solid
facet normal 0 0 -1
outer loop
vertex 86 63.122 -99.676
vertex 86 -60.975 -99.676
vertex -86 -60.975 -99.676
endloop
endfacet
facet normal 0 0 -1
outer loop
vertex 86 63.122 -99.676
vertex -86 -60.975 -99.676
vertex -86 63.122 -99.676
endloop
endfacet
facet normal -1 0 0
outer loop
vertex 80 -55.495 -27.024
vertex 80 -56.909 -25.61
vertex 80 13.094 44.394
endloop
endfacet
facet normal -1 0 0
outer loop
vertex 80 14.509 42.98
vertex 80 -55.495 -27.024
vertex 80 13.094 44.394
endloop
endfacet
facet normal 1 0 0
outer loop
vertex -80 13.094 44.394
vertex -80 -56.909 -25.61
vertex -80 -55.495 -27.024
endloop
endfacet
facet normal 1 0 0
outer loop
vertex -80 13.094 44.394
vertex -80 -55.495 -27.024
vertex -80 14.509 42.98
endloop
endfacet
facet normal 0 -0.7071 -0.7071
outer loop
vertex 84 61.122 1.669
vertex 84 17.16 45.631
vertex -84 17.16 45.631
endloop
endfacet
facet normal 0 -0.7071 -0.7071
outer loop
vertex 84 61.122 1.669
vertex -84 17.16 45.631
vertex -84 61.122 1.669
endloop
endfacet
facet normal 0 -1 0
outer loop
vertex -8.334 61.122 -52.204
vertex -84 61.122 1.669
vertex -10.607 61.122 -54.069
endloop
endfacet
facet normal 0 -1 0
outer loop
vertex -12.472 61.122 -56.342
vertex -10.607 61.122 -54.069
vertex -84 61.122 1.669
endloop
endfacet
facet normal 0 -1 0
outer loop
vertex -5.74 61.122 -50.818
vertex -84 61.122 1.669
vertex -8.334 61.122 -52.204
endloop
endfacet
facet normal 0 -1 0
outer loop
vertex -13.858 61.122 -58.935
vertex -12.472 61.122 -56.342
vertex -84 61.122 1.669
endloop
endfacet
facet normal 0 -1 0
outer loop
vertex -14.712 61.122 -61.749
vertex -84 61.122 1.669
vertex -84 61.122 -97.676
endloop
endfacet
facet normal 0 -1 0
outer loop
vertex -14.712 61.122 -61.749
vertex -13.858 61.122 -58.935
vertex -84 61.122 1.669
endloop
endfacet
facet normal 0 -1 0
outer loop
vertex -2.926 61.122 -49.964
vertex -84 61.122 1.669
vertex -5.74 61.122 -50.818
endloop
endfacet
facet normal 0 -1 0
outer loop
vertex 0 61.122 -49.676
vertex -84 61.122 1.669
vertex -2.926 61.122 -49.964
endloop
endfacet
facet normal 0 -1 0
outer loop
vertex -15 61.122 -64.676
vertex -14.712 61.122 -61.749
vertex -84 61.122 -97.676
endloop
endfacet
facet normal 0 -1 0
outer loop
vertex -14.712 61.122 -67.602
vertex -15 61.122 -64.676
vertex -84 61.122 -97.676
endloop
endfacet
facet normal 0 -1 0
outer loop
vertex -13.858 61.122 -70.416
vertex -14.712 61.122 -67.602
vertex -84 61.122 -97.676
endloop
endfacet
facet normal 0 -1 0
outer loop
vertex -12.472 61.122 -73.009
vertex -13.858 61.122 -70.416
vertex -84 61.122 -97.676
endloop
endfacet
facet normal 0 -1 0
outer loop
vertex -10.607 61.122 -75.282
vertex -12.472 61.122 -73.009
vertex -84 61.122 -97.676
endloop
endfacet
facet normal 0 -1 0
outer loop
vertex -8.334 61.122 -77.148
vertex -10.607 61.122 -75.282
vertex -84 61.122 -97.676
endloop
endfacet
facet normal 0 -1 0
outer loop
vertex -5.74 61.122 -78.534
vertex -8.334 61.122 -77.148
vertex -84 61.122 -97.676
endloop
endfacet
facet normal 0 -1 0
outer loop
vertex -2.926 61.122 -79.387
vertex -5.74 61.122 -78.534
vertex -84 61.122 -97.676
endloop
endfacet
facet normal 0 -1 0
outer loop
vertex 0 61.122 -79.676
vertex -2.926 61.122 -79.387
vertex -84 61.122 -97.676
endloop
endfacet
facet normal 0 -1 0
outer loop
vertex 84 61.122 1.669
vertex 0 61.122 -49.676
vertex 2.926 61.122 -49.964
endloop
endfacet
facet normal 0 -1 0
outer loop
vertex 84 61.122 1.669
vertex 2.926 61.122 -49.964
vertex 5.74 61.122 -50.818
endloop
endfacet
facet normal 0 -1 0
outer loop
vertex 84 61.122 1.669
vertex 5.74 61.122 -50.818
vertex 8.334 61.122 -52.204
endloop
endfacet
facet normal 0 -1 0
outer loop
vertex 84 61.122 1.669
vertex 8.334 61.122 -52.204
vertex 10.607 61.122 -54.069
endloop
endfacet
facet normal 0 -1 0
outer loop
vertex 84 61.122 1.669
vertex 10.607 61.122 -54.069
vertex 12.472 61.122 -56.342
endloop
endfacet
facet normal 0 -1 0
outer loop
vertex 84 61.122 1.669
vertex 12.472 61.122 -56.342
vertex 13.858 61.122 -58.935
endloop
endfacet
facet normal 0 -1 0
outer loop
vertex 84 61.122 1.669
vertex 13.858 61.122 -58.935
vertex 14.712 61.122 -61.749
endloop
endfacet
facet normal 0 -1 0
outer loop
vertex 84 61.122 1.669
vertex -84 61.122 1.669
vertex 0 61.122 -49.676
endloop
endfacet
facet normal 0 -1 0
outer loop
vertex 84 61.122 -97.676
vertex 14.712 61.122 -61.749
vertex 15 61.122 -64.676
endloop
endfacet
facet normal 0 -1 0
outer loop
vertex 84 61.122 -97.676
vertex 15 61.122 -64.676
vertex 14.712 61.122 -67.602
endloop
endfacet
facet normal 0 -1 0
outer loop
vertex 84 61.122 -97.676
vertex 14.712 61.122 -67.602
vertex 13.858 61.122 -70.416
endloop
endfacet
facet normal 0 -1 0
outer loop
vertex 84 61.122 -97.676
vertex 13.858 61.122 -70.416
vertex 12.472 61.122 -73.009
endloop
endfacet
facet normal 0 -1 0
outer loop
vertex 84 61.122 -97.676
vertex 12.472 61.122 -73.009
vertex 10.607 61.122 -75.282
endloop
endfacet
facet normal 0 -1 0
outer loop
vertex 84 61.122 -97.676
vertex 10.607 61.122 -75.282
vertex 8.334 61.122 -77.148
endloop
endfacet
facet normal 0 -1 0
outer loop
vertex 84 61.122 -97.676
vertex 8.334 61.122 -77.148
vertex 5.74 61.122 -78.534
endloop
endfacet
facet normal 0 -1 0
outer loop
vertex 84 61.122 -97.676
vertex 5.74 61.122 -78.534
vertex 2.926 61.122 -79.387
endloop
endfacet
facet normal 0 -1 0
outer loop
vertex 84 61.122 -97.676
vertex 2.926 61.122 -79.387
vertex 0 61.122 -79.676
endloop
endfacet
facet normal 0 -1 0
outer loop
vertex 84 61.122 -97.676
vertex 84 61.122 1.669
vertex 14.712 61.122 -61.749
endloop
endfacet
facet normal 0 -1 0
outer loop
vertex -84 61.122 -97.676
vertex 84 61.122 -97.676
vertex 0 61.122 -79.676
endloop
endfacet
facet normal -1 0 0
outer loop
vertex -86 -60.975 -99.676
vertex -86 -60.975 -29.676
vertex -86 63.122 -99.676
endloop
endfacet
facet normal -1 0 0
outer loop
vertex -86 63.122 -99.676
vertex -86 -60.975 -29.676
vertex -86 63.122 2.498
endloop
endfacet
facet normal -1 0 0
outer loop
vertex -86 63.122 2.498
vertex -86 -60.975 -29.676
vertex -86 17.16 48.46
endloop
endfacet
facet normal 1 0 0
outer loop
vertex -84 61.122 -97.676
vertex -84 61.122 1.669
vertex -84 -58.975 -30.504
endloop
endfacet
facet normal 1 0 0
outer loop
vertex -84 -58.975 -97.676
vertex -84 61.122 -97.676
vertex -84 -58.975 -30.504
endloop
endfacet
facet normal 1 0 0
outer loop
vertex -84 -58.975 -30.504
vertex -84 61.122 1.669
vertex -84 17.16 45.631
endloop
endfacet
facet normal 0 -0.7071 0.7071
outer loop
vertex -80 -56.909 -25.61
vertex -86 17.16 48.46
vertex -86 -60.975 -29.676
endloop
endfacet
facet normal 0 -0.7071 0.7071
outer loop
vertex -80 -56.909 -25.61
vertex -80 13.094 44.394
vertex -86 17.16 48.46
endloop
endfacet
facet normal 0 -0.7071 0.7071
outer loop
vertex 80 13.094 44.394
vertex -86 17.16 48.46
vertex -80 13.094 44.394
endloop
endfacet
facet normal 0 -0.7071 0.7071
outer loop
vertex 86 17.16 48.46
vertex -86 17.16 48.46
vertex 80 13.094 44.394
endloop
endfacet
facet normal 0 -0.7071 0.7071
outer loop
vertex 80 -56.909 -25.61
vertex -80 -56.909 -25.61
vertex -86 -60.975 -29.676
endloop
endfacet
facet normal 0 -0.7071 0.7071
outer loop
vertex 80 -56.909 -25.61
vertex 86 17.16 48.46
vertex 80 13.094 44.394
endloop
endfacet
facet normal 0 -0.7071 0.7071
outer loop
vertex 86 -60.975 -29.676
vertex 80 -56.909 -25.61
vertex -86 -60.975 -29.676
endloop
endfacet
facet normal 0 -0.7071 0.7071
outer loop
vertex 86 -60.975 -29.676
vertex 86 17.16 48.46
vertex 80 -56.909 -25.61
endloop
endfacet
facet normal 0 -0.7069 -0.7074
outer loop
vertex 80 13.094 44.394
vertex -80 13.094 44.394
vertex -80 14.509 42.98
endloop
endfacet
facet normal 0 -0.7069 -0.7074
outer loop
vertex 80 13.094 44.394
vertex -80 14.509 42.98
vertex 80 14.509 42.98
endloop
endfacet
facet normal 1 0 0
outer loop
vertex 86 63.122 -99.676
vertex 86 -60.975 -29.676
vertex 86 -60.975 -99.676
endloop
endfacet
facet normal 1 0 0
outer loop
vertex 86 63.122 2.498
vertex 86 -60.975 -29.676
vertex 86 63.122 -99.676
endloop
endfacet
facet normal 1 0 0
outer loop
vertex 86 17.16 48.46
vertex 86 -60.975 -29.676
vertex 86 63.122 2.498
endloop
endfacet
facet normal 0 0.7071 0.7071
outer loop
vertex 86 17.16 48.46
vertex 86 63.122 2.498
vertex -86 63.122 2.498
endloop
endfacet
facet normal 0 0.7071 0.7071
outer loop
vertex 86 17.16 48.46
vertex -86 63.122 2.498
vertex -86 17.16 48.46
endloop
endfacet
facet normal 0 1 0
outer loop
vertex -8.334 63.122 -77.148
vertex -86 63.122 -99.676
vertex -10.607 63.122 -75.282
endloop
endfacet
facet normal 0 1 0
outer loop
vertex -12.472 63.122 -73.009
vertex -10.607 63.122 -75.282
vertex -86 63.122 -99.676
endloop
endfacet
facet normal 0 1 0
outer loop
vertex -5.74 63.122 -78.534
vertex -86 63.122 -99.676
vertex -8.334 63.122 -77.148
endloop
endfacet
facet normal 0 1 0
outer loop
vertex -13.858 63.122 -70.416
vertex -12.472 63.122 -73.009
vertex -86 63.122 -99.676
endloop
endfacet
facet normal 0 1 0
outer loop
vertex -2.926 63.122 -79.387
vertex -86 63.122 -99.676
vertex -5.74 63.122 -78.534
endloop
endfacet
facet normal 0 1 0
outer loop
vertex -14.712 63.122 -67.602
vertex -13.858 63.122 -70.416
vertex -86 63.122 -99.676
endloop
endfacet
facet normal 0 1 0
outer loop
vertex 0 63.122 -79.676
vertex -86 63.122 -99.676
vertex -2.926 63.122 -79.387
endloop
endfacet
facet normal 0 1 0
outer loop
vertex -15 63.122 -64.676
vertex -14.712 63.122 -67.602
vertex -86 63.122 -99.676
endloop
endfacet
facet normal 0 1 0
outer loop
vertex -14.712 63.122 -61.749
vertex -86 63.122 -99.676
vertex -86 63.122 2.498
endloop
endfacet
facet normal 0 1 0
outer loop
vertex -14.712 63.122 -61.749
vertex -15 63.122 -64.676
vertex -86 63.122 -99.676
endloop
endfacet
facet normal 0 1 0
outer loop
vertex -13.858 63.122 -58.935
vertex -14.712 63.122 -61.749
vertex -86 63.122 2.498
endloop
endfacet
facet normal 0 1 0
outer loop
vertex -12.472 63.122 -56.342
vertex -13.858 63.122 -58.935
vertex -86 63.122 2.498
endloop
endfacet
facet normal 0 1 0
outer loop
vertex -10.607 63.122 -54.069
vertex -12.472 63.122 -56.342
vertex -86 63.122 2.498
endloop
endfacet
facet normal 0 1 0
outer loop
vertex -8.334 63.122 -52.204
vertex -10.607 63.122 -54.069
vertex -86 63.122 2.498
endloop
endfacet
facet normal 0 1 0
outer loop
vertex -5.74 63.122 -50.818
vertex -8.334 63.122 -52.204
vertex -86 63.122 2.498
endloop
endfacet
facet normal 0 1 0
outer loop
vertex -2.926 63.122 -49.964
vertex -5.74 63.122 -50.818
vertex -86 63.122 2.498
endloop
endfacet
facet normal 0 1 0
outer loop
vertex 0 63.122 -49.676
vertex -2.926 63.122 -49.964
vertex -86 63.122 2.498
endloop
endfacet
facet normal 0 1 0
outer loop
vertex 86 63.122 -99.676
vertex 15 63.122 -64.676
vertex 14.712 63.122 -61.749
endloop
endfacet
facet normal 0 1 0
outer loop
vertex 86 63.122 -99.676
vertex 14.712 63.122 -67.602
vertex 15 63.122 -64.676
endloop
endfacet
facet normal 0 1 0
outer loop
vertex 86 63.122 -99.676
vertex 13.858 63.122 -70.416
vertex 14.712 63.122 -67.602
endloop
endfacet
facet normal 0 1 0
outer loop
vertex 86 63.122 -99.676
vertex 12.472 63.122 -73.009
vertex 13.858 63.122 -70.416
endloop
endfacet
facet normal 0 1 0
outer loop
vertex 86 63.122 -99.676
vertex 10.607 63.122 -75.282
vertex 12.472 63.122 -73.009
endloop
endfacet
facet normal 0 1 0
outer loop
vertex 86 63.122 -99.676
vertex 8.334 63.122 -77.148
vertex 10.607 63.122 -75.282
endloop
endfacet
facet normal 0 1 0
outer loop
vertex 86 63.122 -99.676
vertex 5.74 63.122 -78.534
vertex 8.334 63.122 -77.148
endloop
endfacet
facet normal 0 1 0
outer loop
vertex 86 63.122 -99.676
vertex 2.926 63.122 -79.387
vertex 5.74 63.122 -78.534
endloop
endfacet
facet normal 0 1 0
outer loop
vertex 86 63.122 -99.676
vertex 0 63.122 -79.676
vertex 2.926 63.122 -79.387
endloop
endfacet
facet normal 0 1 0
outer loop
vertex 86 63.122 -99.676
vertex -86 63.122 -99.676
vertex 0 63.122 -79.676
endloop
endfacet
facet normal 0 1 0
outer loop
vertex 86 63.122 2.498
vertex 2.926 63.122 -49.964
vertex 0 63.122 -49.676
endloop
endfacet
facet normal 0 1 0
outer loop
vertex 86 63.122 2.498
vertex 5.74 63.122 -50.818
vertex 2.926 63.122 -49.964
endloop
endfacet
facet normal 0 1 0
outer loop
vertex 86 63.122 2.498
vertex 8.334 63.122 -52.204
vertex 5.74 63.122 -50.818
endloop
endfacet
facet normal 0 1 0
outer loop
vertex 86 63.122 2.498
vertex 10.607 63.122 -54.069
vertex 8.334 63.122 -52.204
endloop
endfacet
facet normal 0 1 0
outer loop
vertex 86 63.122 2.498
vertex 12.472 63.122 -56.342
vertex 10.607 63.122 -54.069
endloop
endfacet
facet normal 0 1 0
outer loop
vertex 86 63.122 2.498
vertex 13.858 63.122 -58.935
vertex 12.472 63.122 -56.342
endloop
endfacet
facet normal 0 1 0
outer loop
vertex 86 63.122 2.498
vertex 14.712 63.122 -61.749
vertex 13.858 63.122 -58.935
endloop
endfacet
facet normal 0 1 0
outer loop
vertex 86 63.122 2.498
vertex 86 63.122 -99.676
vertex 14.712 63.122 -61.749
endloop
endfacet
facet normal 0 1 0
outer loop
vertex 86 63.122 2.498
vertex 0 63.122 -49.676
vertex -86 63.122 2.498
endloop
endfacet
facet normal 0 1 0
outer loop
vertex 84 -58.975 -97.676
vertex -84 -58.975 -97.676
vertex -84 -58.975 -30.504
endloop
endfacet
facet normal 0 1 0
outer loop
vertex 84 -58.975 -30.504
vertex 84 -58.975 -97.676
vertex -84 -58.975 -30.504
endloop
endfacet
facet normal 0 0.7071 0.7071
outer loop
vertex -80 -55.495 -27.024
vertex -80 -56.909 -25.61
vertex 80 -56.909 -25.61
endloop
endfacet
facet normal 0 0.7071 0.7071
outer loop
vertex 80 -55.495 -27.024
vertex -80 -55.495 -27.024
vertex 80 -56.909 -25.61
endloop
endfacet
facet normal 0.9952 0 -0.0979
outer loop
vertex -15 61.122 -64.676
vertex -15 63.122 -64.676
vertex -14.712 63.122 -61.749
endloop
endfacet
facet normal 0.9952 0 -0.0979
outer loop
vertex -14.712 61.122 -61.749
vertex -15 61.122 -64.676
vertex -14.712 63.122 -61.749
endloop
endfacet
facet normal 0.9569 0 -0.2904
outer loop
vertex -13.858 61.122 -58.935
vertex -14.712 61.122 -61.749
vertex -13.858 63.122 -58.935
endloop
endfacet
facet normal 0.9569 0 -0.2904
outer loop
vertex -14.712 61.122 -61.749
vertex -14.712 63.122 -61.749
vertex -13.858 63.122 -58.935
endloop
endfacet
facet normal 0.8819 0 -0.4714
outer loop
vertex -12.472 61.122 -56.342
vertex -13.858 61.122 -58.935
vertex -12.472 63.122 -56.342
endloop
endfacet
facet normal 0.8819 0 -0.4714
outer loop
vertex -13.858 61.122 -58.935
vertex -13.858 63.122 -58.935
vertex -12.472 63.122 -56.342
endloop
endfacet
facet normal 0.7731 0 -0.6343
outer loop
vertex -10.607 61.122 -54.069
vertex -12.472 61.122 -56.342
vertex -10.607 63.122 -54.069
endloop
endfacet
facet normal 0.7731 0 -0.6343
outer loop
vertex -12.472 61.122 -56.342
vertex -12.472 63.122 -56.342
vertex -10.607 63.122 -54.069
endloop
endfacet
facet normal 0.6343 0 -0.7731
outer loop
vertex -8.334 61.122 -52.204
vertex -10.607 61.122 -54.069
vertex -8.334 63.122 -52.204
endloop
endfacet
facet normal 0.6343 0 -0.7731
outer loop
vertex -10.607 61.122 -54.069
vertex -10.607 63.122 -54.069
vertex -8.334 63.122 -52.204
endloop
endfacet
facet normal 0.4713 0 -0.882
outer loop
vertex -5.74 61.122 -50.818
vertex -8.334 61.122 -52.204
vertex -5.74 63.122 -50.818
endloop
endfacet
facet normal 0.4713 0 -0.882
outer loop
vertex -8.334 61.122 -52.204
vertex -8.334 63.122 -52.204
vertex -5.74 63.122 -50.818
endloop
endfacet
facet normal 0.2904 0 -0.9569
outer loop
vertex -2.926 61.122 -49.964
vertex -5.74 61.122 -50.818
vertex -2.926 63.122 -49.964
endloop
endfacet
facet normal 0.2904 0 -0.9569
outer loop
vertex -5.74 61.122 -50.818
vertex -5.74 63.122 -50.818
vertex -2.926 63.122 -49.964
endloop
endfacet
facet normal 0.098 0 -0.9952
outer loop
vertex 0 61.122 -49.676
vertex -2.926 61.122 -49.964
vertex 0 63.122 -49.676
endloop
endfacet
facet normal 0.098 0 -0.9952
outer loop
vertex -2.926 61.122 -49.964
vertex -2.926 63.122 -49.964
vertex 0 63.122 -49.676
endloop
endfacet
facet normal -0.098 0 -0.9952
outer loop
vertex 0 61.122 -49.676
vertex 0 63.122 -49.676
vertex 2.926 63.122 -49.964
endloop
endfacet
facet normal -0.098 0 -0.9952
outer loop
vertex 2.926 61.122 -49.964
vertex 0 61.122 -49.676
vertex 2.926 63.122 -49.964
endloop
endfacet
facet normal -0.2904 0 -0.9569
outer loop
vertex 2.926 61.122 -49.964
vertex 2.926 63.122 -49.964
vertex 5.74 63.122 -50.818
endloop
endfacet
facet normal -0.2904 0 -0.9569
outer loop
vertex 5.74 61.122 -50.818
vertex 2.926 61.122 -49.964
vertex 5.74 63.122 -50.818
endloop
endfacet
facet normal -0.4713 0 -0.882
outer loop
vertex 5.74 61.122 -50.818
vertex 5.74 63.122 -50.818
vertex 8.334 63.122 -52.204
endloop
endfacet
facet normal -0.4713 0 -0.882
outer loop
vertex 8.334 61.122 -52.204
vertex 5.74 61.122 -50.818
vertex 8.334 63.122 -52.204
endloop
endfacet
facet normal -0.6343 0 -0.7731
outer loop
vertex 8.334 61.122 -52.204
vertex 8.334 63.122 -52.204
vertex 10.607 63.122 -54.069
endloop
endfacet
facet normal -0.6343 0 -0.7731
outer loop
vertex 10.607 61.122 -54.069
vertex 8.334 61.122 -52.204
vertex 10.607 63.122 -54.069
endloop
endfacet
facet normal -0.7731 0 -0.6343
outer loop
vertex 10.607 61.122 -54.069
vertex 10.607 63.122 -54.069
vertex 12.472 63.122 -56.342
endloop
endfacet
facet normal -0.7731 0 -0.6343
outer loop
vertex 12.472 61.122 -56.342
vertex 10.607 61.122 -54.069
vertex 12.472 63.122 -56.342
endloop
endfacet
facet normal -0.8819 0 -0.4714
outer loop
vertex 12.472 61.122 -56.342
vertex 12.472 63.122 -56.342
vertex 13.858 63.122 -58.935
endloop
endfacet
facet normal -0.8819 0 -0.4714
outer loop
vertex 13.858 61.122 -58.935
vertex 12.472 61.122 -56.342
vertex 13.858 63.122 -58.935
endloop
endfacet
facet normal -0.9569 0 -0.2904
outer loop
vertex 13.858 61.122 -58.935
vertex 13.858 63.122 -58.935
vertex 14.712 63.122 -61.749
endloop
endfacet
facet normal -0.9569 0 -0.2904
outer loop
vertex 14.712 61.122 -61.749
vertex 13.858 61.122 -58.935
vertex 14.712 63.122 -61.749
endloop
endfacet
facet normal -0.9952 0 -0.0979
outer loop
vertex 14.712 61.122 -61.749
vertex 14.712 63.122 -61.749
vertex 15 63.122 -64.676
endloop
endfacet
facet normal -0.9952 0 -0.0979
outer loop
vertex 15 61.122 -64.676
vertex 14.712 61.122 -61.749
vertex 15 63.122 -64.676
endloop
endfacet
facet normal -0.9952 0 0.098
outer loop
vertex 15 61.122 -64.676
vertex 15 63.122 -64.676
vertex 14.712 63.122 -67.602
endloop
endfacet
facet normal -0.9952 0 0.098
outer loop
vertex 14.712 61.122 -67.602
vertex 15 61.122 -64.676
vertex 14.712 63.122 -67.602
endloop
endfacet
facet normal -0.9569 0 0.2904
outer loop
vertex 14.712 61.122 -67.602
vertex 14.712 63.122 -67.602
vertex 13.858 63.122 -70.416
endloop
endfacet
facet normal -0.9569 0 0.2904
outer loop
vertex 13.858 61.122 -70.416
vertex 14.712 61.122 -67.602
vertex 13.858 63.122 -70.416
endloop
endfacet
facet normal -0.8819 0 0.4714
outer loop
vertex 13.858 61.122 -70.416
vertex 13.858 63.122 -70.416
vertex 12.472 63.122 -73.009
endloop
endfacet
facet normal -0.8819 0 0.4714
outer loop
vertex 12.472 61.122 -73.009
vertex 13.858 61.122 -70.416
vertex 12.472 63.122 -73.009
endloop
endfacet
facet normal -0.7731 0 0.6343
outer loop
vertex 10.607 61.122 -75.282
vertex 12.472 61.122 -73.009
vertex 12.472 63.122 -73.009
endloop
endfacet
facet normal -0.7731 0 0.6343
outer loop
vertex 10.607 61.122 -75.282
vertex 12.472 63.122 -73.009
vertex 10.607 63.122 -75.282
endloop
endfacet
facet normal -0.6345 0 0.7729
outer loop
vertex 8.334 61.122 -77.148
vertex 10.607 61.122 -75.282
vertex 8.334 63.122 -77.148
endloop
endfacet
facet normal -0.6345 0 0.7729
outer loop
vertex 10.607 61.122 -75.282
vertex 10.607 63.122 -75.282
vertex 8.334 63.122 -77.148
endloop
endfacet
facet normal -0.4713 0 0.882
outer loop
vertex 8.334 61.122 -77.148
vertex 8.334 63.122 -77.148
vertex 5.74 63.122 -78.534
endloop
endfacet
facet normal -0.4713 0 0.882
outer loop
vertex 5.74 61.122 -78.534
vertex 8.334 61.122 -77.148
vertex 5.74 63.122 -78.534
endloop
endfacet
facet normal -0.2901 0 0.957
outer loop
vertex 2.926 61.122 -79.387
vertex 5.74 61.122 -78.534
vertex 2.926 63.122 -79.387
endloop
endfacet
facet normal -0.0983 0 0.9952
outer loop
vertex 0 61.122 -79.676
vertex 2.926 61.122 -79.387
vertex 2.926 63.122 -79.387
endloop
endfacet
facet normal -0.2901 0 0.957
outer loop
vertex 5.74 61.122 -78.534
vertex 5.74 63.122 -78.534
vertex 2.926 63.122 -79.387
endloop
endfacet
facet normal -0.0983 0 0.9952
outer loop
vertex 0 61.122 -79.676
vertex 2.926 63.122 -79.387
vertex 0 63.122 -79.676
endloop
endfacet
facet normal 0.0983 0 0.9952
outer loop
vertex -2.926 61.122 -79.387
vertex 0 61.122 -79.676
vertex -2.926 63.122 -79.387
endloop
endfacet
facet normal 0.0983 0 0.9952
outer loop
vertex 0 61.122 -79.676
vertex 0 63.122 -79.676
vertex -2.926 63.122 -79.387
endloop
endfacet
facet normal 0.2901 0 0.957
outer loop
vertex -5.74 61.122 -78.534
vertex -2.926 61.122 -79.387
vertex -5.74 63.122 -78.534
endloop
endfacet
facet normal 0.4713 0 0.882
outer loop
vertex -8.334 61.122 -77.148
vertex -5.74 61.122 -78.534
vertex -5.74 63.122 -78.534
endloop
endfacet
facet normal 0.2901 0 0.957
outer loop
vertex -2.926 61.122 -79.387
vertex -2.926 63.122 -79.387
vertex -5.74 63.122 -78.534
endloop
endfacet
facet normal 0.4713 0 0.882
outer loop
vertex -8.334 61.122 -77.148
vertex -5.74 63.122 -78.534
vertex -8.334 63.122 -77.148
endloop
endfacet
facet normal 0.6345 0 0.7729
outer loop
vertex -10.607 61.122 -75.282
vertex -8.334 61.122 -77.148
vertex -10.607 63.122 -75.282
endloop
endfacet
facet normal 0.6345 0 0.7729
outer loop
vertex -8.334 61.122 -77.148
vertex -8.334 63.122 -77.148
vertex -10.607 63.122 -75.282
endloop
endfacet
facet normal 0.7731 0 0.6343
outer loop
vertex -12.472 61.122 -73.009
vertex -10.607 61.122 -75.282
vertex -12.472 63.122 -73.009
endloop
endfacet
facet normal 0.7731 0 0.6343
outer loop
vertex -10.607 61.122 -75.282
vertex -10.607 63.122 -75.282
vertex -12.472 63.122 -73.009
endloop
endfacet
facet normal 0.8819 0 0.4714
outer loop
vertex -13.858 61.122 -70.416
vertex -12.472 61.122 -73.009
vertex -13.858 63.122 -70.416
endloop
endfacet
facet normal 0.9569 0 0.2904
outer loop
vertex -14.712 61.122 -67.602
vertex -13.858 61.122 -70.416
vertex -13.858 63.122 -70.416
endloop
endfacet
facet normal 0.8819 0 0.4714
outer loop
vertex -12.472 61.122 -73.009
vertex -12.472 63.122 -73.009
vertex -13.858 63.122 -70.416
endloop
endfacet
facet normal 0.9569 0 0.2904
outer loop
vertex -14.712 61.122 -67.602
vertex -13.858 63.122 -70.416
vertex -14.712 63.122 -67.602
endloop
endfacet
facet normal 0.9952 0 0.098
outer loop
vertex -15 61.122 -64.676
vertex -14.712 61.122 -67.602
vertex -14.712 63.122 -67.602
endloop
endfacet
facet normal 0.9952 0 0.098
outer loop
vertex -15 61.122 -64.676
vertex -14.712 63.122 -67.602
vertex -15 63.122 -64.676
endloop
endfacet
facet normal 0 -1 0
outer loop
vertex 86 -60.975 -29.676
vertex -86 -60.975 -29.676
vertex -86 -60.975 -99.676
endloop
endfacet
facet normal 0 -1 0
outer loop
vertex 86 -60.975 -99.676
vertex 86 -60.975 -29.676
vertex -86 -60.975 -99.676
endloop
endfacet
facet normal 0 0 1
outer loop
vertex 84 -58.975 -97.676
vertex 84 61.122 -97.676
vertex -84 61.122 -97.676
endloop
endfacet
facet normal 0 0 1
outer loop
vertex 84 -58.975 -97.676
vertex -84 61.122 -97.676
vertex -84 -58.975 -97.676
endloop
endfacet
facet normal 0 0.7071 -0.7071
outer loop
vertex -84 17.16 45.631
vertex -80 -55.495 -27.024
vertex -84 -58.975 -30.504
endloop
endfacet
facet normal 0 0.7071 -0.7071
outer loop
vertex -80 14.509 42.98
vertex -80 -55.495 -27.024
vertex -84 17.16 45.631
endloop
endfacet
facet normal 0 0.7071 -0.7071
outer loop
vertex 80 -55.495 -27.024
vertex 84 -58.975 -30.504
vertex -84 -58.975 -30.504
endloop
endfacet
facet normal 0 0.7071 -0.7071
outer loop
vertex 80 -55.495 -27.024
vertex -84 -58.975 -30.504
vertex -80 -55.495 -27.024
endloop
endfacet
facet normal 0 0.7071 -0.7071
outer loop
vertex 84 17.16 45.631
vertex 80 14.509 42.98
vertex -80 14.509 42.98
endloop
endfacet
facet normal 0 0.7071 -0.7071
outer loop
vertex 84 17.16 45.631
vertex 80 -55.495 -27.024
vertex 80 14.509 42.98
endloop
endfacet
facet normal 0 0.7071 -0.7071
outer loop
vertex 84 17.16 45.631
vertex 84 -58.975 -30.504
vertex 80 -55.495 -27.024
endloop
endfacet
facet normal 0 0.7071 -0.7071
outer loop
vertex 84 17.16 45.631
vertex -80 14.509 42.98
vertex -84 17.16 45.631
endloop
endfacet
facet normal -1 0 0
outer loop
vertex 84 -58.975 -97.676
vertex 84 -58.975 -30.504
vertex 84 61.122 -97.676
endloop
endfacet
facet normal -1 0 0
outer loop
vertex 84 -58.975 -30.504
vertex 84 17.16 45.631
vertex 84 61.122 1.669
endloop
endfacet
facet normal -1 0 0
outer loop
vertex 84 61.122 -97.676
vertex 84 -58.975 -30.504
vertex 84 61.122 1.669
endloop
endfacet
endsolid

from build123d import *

# Parameters (mm, degrees)
F1_DEPTH = 86
F2_W     = 160
F2_H     = 99
F3_DEPTH = 25
F4_R     = 15
F5_DEPTH = 25
F7_DEPTH = 2
F9_DEPTH = 2


with BuildPart() as f1:
    # F0 (on Right) → F1 (new body, symmetric)
    with BuildSketch(Plane.YZ):
        Polygon((63.122124, 2.497642), (17.160184, 48.459583), (-60.975116, -29.675717), (-60.975116, -99.675717), (63.122124, -99.675717), align=None)
        Polygon((61.122124, -97.675716), (-58.975115, -97.675716), (-58.975115, -30.504144), (17.160184, 45.631155), (61.122124, 1.669215), align=None, mode=Mode.SUBTRACT)
    extrude(amount=F1_DEPTH, both=True)

    # F2 (on face) → F3 (cut)
    with BuildSketch(Plane(origin=(0, -15.6497, 15.6497), x_dir=(1, 0, 0), z_dir=(0, -0.707107, 0.707107))):
        with Locations((0, -8.849818)):
            Rectangle(F2_W, F2_H)
    extrude(amount=-F3_DEPTH, mode=Mode.SUBTRACT)

    # F4 (on face) → F5 (cut)
    with BuildSketch(Plane(origin=(0, 63.122124, 0), x_dir=(-1, 0, 0), z_dir=(0, 1, 0))):
        with Locations((0, -64.675717)):
            Circle(F4_R)
    extrude(amount=-F5_DEPTH, mode=Mode.SUBTRACT)

    # F6 (on face) → F7 (join)
    with BuildSketch(Plane.YZ.offset(86)):
        Polygon((63.122124, 2.497642), (17.160184, 48.459583), (-60.975116, -29.675717), (-60.975116, -99.675717), (63.122124, -99.675717), align=None)
    extrude(amount=-F7_DEPTH)

    # F8 (on face) → F9 (join)
    with BuildSketch(Plane(origin=(-86, 0, 0), x_dir=(0, -1, 0), z_dir=(-1, 0, 0))):
        Polygon((-17.160184, 48.459583), (-63.122124, 2.497642), (-63.122124, -99.675717), (60.975116, -99.675717), (60.975116, -29.675717), align=None)
    extrude(amount=-F9_DEPTH)


solid = f1.part
